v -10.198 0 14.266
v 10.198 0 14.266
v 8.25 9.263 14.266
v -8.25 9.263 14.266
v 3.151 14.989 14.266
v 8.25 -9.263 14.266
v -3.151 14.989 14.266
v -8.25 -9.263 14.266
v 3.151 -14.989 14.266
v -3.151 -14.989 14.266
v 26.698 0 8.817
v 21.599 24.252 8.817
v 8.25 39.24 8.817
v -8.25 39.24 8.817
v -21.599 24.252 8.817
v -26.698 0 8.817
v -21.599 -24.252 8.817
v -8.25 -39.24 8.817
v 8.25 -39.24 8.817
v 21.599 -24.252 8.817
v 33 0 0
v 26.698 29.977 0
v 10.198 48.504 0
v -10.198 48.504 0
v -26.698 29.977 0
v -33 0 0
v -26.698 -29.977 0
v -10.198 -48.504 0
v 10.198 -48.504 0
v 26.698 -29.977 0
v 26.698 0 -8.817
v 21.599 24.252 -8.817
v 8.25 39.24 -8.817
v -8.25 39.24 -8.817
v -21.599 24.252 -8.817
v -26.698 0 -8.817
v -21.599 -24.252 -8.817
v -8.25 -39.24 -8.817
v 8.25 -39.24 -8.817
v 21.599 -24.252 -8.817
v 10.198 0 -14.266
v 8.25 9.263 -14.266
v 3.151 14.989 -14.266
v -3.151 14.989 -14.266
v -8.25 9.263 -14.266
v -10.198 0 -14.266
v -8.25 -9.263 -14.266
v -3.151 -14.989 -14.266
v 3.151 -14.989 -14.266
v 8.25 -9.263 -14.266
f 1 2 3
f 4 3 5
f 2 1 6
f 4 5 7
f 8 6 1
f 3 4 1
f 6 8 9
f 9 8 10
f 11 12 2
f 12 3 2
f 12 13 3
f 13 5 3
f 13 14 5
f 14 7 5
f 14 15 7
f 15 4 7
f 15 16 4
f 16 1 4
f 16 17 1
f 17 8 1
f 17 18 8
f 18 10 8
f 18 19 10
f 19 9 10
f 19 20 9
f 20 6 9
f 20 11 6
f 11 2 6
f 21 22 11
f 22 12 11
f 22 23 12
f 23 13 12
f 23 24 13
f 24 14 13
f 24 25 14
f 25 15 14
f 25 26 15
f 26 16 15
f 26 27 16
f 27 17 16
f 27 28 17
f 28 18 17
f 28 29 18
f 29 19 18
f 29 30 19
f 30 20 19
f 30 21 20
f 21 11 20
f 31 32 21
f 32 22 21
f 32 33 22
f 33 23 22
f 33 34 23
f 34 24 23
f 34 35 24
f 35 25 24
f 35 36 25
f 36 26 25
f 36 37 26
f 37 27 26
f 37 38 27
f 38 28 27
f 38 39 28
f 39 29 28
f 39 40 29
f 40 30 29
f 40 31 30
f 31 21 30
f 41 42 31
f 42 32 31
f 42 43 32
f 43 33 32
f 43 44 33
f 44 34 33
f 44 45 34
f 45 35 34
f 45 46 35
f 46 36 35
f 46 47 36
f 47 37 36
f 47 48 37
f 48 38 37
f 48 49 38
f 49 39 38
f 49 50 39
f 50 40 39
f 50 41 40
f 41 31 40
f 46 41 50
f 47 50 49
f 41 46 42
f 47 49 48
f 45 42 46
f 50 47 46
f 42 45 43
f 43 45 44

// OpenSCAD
// Generated by SolidPython 1.0.1 on 2020-07-29 00:46:50


scale(v = [11, 17, 5]) {
	sphere(r = 3);
}
/***********************************************
*********      SolidPython code:      **********
************************************************
 
# import packages: SolidPython
from solid import *
from solid.utils import *
from itertools import chain, combinations, permutations


class Resize:

    def __init__(self, scad_file):
        self.scad_file = scad_file
        #self.scad_file = import_scad(scad_file)
        # cone/cylinder param:
        self.r1 = 0
        self.r2 = 0
        self.h = 0
        # rectangular prism param:
        self.w = 0
        self.l = 0
        # ellipse param:
        self.r = 0

    # import OpenScad code (file name corresponds to shape)


    # classify shape + parameters
    def assign(self, param1, param2, param3):
        if self.scad_file == 'cone.scad':
            self.r1 = param1
            self.r2 = param2
            self.h = param3
        elif self.scad_file == 'cylinder.scad':
            self.r1 = param1
            self.r2 = param2
            self.h = param3
        elif self.scad_file == 'rectangularPrism.scad':
            self.h = param1
            self.l = param2
            self.w = param3
        else:
            self.r = param1
            self.h = param2

    # resize parameters
    def iterate(self):
        x = range(3, 20, 2)
        i = 1
        if self.scad_file == 'cone.scad':
            tempList = list(permutations(x, 2))
            for temp in tempList:
                param1 = temp[0]
                param2 = temp[1]
                filepath = 'produced_scad_files/' + 'cone' + str(param1) + '_' + str(param2) + '_' + '.scad'
                scad_render_to_file(cylinder(h=param1, r1=param2, r2=0), filepath)

        elif self.scad_file == 'cylinder.scad':
            tempList = list(permutations(x, 3))
            for temp in tempList:
                param1 = temp[0]
                param2 = temp[1]
                filepath = 'produced_scad_files/' + 'cylinder' + str(param1) + '_' + str(param2) + '_' + '.scad'
                scad_render_to_file(cylinder(h=param1, r1=param2, r2=param2), filepath)

        elif self.scad_file == 'rectangularPrism.scad':
            tempList = list(permutations(x, 3))
            for temp in tempList:
                param1 = temp[0]
                param2 = temp[1]
                param3 = temp[2]
                filepath = 'produced_scad_files/' + 'rectangularPrism' + str(param1) + '_' + str(param2) + '_' + str(
                    param3) + '.scad'
                scad_render_to_file(cube(size=(param1, param2, param3)), filepath)

        elif self.scad_file == 'ellipse.scad':
            tempList = list(permutations(x, 4))
            for temp in tempList:
                param1 = temp[0]
                param2 = temp[1]
                param3 = temp[2]
                param4 = temp[3]
                filepath = 'produced_scad_files/' + 'ellipse' + str(param1) + '_' + str(param2) + '_' + str(param3) + '_' + str(param4) + '.scad'
                scad_render_to_file(scale([param1, param2, param3])(sphere(r=param4)), filepath)

    def render_to_scadfile(self):
        scad_render_to_file(scad, 'example.scad') 
 
************************************************/
